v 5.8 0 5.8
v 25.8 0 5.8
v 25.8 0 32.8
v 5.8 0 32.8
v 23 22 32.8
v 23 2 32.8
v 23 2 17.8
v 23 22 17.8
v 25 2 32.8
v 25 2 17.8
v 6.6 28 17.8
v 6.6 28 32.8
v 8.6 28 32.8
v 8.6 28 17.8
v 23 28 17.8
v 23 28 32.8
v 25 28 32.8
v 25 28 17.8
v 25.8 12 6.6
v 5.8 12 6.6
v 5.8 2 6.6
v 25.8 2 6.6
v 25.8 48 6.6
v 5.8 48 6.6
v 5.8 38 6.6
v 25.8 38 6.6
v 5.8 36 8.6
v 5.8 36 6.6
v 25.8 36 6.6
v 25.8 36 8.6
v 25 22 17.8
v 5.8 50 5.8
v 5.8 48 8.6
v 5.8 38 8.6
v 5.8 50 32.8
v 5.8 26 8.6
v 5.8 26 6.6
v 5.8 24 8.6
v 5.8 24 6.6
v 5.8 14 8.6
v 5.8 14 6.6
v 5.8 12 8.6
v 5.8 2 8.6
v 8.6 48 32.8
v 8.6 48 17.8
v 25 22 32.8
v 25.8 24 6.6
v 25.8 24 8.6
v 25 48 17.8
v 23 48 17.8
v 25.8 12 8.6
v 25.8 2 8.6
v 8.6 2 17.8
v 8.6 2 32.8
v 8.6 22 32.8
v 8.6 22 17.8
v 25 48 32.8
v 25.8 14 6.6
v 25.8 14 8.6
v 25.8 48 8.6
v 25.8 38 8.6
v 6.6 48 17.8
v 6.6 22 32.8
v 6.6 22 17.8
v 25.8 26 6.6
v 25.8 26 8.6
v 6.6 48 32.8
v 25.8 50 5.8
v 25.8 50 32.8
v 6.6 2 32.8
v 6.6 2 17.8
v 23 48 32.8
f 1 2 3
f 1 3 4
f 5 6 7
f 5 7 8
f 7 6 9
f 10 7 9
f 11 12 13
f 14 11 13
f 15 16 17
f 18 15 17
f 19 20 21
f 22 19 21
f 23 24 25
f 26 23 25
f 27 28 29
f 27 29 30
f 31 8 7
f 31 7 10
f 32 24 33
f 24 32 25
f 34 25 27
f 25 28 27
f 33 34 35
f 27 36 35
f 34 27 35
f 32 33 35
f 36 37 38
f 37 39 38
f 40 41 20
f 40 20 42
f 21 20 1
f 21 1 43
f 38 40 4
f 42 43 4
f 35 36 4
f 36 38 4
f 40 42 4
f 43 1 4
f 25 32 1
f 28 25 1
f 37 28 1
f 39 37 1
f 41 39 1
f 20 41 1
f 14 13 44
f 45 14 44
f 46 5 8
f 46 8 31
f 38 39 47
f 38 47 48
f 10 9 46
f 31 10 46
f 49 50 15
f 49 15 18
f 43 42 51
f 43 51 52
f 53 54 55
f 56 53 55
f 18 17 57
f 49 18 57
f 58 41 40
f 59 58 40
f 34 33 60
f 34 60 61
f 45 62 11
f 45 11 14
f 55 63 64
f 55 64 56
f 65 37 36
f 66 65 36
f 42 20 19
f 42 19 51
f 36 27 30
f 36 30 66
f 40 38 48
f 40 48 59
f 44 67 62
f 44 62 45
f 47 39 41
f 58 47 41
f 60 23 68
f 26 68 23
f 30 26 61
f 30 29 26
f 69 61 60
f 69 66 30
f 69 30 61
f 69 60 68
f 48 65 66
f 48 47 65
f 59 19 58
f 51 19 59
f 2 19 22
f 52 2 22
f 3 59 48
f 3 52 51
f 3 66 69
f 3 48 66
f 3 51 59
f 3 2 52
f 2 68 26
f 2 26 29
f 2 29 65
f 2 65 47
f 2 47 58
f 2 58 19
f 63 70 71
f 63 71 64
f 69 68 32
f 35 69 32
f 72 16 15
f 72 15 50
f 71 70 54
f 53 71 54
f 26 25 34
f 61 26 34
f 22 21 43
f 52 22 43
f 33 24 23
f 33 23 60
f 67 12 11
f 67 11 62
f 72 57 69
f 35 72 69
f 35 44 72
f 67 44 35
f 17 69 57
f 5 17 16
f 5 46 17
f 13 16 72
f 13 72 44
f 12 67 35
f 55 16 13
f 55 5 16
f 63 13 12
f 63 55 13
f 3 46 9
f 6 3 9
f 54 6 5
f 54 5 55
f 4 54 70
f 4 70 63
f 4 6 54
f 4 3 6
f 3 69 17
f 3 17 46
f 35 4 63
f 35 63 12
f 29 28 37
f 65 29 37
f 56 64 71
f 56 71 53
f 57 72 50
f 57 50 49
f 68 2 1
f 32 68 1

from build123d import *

# Parameters (mm, degrees)
SKETCH003_W            = 20
SKETCH003_H            = 27
PAD001_DEPTH           = 50
SKETCH004_W            = 10
SKETCH004_H            = 2
POCKET002_DEPTH        = 20.001
LINEARPATTERN002_COUNT = 4
LINEARPATTERN002_PITCH = 12
SKETCH005_W            = 2
SKETCH005_H            = 20
POCKET003_DEPTH        = 15
LINEARPATTERN003_COUNT = 2
LINEARPATTERN003_PITCH = 26


with BuildPart() as part:
    # Sketch003 (on ShapeBinder) → Pad001 (new body)
    with BuildSketch(Plane(origin=(0, 0, 0), x_dir=(-1, 0, 0), z_dir=(0, 1, 0))):
        with Locations((-15.8, 19.3)):
            Rectangle(SKETCH003_W, SKETCH003_H)
    extrude(amount=PAD001_DEPTH)

    # Sketch004 (on Face2 of Pad001) → Pocket002 (cut, through all)
    with BuildSketch(Plane(origin=(5.8, 0, 0), x_dir=(0, -1, 0), z_dir=(-1, 0, 0))):
        with Locations((-7, 7.6)):
            Rectangle(SKETCH004_W, SKETCH004_H)
    pocket002 = extrude(amount=-POCKET002_DEPTH, mode=Mode.SUBTRACT)

    # LinearPattern002: Pocket002 ×4
    with Locations(*[(0, i * LINEARPATTERN002_PITCH, 0) for i in range(1, LINEARPATTERN002_COUNT)]):
        add(pocket002, mode=Mode.SUBTRACT)

    # Sketch005 (on Face1 of LinearPattern002) → Pocket003 (cut)
    with BuildSketch(Plane.XY.offset(32.8)):
        with Locations((7.6, 12)):
            Rectangle(SKETCH005_W, SKETCH005_H)
        with Locations((24, 12)):
            Rectangle(SKETCH005_W, SKETCH005_H)
    pocket003 = extrude(amount=-POCKET003_DEPTH, mode=Mode.SUBTRACT)

    # LinearPattern003: Pocket003 ×2
    with Locations(*[(0, i * LINEARPATTERN003_PITCH, 0) for i in range(1, LINEARPATTERN003_COUNT)]):
        add(pocket003, mode=Mode.SUBTRACT)


solid = part.part
